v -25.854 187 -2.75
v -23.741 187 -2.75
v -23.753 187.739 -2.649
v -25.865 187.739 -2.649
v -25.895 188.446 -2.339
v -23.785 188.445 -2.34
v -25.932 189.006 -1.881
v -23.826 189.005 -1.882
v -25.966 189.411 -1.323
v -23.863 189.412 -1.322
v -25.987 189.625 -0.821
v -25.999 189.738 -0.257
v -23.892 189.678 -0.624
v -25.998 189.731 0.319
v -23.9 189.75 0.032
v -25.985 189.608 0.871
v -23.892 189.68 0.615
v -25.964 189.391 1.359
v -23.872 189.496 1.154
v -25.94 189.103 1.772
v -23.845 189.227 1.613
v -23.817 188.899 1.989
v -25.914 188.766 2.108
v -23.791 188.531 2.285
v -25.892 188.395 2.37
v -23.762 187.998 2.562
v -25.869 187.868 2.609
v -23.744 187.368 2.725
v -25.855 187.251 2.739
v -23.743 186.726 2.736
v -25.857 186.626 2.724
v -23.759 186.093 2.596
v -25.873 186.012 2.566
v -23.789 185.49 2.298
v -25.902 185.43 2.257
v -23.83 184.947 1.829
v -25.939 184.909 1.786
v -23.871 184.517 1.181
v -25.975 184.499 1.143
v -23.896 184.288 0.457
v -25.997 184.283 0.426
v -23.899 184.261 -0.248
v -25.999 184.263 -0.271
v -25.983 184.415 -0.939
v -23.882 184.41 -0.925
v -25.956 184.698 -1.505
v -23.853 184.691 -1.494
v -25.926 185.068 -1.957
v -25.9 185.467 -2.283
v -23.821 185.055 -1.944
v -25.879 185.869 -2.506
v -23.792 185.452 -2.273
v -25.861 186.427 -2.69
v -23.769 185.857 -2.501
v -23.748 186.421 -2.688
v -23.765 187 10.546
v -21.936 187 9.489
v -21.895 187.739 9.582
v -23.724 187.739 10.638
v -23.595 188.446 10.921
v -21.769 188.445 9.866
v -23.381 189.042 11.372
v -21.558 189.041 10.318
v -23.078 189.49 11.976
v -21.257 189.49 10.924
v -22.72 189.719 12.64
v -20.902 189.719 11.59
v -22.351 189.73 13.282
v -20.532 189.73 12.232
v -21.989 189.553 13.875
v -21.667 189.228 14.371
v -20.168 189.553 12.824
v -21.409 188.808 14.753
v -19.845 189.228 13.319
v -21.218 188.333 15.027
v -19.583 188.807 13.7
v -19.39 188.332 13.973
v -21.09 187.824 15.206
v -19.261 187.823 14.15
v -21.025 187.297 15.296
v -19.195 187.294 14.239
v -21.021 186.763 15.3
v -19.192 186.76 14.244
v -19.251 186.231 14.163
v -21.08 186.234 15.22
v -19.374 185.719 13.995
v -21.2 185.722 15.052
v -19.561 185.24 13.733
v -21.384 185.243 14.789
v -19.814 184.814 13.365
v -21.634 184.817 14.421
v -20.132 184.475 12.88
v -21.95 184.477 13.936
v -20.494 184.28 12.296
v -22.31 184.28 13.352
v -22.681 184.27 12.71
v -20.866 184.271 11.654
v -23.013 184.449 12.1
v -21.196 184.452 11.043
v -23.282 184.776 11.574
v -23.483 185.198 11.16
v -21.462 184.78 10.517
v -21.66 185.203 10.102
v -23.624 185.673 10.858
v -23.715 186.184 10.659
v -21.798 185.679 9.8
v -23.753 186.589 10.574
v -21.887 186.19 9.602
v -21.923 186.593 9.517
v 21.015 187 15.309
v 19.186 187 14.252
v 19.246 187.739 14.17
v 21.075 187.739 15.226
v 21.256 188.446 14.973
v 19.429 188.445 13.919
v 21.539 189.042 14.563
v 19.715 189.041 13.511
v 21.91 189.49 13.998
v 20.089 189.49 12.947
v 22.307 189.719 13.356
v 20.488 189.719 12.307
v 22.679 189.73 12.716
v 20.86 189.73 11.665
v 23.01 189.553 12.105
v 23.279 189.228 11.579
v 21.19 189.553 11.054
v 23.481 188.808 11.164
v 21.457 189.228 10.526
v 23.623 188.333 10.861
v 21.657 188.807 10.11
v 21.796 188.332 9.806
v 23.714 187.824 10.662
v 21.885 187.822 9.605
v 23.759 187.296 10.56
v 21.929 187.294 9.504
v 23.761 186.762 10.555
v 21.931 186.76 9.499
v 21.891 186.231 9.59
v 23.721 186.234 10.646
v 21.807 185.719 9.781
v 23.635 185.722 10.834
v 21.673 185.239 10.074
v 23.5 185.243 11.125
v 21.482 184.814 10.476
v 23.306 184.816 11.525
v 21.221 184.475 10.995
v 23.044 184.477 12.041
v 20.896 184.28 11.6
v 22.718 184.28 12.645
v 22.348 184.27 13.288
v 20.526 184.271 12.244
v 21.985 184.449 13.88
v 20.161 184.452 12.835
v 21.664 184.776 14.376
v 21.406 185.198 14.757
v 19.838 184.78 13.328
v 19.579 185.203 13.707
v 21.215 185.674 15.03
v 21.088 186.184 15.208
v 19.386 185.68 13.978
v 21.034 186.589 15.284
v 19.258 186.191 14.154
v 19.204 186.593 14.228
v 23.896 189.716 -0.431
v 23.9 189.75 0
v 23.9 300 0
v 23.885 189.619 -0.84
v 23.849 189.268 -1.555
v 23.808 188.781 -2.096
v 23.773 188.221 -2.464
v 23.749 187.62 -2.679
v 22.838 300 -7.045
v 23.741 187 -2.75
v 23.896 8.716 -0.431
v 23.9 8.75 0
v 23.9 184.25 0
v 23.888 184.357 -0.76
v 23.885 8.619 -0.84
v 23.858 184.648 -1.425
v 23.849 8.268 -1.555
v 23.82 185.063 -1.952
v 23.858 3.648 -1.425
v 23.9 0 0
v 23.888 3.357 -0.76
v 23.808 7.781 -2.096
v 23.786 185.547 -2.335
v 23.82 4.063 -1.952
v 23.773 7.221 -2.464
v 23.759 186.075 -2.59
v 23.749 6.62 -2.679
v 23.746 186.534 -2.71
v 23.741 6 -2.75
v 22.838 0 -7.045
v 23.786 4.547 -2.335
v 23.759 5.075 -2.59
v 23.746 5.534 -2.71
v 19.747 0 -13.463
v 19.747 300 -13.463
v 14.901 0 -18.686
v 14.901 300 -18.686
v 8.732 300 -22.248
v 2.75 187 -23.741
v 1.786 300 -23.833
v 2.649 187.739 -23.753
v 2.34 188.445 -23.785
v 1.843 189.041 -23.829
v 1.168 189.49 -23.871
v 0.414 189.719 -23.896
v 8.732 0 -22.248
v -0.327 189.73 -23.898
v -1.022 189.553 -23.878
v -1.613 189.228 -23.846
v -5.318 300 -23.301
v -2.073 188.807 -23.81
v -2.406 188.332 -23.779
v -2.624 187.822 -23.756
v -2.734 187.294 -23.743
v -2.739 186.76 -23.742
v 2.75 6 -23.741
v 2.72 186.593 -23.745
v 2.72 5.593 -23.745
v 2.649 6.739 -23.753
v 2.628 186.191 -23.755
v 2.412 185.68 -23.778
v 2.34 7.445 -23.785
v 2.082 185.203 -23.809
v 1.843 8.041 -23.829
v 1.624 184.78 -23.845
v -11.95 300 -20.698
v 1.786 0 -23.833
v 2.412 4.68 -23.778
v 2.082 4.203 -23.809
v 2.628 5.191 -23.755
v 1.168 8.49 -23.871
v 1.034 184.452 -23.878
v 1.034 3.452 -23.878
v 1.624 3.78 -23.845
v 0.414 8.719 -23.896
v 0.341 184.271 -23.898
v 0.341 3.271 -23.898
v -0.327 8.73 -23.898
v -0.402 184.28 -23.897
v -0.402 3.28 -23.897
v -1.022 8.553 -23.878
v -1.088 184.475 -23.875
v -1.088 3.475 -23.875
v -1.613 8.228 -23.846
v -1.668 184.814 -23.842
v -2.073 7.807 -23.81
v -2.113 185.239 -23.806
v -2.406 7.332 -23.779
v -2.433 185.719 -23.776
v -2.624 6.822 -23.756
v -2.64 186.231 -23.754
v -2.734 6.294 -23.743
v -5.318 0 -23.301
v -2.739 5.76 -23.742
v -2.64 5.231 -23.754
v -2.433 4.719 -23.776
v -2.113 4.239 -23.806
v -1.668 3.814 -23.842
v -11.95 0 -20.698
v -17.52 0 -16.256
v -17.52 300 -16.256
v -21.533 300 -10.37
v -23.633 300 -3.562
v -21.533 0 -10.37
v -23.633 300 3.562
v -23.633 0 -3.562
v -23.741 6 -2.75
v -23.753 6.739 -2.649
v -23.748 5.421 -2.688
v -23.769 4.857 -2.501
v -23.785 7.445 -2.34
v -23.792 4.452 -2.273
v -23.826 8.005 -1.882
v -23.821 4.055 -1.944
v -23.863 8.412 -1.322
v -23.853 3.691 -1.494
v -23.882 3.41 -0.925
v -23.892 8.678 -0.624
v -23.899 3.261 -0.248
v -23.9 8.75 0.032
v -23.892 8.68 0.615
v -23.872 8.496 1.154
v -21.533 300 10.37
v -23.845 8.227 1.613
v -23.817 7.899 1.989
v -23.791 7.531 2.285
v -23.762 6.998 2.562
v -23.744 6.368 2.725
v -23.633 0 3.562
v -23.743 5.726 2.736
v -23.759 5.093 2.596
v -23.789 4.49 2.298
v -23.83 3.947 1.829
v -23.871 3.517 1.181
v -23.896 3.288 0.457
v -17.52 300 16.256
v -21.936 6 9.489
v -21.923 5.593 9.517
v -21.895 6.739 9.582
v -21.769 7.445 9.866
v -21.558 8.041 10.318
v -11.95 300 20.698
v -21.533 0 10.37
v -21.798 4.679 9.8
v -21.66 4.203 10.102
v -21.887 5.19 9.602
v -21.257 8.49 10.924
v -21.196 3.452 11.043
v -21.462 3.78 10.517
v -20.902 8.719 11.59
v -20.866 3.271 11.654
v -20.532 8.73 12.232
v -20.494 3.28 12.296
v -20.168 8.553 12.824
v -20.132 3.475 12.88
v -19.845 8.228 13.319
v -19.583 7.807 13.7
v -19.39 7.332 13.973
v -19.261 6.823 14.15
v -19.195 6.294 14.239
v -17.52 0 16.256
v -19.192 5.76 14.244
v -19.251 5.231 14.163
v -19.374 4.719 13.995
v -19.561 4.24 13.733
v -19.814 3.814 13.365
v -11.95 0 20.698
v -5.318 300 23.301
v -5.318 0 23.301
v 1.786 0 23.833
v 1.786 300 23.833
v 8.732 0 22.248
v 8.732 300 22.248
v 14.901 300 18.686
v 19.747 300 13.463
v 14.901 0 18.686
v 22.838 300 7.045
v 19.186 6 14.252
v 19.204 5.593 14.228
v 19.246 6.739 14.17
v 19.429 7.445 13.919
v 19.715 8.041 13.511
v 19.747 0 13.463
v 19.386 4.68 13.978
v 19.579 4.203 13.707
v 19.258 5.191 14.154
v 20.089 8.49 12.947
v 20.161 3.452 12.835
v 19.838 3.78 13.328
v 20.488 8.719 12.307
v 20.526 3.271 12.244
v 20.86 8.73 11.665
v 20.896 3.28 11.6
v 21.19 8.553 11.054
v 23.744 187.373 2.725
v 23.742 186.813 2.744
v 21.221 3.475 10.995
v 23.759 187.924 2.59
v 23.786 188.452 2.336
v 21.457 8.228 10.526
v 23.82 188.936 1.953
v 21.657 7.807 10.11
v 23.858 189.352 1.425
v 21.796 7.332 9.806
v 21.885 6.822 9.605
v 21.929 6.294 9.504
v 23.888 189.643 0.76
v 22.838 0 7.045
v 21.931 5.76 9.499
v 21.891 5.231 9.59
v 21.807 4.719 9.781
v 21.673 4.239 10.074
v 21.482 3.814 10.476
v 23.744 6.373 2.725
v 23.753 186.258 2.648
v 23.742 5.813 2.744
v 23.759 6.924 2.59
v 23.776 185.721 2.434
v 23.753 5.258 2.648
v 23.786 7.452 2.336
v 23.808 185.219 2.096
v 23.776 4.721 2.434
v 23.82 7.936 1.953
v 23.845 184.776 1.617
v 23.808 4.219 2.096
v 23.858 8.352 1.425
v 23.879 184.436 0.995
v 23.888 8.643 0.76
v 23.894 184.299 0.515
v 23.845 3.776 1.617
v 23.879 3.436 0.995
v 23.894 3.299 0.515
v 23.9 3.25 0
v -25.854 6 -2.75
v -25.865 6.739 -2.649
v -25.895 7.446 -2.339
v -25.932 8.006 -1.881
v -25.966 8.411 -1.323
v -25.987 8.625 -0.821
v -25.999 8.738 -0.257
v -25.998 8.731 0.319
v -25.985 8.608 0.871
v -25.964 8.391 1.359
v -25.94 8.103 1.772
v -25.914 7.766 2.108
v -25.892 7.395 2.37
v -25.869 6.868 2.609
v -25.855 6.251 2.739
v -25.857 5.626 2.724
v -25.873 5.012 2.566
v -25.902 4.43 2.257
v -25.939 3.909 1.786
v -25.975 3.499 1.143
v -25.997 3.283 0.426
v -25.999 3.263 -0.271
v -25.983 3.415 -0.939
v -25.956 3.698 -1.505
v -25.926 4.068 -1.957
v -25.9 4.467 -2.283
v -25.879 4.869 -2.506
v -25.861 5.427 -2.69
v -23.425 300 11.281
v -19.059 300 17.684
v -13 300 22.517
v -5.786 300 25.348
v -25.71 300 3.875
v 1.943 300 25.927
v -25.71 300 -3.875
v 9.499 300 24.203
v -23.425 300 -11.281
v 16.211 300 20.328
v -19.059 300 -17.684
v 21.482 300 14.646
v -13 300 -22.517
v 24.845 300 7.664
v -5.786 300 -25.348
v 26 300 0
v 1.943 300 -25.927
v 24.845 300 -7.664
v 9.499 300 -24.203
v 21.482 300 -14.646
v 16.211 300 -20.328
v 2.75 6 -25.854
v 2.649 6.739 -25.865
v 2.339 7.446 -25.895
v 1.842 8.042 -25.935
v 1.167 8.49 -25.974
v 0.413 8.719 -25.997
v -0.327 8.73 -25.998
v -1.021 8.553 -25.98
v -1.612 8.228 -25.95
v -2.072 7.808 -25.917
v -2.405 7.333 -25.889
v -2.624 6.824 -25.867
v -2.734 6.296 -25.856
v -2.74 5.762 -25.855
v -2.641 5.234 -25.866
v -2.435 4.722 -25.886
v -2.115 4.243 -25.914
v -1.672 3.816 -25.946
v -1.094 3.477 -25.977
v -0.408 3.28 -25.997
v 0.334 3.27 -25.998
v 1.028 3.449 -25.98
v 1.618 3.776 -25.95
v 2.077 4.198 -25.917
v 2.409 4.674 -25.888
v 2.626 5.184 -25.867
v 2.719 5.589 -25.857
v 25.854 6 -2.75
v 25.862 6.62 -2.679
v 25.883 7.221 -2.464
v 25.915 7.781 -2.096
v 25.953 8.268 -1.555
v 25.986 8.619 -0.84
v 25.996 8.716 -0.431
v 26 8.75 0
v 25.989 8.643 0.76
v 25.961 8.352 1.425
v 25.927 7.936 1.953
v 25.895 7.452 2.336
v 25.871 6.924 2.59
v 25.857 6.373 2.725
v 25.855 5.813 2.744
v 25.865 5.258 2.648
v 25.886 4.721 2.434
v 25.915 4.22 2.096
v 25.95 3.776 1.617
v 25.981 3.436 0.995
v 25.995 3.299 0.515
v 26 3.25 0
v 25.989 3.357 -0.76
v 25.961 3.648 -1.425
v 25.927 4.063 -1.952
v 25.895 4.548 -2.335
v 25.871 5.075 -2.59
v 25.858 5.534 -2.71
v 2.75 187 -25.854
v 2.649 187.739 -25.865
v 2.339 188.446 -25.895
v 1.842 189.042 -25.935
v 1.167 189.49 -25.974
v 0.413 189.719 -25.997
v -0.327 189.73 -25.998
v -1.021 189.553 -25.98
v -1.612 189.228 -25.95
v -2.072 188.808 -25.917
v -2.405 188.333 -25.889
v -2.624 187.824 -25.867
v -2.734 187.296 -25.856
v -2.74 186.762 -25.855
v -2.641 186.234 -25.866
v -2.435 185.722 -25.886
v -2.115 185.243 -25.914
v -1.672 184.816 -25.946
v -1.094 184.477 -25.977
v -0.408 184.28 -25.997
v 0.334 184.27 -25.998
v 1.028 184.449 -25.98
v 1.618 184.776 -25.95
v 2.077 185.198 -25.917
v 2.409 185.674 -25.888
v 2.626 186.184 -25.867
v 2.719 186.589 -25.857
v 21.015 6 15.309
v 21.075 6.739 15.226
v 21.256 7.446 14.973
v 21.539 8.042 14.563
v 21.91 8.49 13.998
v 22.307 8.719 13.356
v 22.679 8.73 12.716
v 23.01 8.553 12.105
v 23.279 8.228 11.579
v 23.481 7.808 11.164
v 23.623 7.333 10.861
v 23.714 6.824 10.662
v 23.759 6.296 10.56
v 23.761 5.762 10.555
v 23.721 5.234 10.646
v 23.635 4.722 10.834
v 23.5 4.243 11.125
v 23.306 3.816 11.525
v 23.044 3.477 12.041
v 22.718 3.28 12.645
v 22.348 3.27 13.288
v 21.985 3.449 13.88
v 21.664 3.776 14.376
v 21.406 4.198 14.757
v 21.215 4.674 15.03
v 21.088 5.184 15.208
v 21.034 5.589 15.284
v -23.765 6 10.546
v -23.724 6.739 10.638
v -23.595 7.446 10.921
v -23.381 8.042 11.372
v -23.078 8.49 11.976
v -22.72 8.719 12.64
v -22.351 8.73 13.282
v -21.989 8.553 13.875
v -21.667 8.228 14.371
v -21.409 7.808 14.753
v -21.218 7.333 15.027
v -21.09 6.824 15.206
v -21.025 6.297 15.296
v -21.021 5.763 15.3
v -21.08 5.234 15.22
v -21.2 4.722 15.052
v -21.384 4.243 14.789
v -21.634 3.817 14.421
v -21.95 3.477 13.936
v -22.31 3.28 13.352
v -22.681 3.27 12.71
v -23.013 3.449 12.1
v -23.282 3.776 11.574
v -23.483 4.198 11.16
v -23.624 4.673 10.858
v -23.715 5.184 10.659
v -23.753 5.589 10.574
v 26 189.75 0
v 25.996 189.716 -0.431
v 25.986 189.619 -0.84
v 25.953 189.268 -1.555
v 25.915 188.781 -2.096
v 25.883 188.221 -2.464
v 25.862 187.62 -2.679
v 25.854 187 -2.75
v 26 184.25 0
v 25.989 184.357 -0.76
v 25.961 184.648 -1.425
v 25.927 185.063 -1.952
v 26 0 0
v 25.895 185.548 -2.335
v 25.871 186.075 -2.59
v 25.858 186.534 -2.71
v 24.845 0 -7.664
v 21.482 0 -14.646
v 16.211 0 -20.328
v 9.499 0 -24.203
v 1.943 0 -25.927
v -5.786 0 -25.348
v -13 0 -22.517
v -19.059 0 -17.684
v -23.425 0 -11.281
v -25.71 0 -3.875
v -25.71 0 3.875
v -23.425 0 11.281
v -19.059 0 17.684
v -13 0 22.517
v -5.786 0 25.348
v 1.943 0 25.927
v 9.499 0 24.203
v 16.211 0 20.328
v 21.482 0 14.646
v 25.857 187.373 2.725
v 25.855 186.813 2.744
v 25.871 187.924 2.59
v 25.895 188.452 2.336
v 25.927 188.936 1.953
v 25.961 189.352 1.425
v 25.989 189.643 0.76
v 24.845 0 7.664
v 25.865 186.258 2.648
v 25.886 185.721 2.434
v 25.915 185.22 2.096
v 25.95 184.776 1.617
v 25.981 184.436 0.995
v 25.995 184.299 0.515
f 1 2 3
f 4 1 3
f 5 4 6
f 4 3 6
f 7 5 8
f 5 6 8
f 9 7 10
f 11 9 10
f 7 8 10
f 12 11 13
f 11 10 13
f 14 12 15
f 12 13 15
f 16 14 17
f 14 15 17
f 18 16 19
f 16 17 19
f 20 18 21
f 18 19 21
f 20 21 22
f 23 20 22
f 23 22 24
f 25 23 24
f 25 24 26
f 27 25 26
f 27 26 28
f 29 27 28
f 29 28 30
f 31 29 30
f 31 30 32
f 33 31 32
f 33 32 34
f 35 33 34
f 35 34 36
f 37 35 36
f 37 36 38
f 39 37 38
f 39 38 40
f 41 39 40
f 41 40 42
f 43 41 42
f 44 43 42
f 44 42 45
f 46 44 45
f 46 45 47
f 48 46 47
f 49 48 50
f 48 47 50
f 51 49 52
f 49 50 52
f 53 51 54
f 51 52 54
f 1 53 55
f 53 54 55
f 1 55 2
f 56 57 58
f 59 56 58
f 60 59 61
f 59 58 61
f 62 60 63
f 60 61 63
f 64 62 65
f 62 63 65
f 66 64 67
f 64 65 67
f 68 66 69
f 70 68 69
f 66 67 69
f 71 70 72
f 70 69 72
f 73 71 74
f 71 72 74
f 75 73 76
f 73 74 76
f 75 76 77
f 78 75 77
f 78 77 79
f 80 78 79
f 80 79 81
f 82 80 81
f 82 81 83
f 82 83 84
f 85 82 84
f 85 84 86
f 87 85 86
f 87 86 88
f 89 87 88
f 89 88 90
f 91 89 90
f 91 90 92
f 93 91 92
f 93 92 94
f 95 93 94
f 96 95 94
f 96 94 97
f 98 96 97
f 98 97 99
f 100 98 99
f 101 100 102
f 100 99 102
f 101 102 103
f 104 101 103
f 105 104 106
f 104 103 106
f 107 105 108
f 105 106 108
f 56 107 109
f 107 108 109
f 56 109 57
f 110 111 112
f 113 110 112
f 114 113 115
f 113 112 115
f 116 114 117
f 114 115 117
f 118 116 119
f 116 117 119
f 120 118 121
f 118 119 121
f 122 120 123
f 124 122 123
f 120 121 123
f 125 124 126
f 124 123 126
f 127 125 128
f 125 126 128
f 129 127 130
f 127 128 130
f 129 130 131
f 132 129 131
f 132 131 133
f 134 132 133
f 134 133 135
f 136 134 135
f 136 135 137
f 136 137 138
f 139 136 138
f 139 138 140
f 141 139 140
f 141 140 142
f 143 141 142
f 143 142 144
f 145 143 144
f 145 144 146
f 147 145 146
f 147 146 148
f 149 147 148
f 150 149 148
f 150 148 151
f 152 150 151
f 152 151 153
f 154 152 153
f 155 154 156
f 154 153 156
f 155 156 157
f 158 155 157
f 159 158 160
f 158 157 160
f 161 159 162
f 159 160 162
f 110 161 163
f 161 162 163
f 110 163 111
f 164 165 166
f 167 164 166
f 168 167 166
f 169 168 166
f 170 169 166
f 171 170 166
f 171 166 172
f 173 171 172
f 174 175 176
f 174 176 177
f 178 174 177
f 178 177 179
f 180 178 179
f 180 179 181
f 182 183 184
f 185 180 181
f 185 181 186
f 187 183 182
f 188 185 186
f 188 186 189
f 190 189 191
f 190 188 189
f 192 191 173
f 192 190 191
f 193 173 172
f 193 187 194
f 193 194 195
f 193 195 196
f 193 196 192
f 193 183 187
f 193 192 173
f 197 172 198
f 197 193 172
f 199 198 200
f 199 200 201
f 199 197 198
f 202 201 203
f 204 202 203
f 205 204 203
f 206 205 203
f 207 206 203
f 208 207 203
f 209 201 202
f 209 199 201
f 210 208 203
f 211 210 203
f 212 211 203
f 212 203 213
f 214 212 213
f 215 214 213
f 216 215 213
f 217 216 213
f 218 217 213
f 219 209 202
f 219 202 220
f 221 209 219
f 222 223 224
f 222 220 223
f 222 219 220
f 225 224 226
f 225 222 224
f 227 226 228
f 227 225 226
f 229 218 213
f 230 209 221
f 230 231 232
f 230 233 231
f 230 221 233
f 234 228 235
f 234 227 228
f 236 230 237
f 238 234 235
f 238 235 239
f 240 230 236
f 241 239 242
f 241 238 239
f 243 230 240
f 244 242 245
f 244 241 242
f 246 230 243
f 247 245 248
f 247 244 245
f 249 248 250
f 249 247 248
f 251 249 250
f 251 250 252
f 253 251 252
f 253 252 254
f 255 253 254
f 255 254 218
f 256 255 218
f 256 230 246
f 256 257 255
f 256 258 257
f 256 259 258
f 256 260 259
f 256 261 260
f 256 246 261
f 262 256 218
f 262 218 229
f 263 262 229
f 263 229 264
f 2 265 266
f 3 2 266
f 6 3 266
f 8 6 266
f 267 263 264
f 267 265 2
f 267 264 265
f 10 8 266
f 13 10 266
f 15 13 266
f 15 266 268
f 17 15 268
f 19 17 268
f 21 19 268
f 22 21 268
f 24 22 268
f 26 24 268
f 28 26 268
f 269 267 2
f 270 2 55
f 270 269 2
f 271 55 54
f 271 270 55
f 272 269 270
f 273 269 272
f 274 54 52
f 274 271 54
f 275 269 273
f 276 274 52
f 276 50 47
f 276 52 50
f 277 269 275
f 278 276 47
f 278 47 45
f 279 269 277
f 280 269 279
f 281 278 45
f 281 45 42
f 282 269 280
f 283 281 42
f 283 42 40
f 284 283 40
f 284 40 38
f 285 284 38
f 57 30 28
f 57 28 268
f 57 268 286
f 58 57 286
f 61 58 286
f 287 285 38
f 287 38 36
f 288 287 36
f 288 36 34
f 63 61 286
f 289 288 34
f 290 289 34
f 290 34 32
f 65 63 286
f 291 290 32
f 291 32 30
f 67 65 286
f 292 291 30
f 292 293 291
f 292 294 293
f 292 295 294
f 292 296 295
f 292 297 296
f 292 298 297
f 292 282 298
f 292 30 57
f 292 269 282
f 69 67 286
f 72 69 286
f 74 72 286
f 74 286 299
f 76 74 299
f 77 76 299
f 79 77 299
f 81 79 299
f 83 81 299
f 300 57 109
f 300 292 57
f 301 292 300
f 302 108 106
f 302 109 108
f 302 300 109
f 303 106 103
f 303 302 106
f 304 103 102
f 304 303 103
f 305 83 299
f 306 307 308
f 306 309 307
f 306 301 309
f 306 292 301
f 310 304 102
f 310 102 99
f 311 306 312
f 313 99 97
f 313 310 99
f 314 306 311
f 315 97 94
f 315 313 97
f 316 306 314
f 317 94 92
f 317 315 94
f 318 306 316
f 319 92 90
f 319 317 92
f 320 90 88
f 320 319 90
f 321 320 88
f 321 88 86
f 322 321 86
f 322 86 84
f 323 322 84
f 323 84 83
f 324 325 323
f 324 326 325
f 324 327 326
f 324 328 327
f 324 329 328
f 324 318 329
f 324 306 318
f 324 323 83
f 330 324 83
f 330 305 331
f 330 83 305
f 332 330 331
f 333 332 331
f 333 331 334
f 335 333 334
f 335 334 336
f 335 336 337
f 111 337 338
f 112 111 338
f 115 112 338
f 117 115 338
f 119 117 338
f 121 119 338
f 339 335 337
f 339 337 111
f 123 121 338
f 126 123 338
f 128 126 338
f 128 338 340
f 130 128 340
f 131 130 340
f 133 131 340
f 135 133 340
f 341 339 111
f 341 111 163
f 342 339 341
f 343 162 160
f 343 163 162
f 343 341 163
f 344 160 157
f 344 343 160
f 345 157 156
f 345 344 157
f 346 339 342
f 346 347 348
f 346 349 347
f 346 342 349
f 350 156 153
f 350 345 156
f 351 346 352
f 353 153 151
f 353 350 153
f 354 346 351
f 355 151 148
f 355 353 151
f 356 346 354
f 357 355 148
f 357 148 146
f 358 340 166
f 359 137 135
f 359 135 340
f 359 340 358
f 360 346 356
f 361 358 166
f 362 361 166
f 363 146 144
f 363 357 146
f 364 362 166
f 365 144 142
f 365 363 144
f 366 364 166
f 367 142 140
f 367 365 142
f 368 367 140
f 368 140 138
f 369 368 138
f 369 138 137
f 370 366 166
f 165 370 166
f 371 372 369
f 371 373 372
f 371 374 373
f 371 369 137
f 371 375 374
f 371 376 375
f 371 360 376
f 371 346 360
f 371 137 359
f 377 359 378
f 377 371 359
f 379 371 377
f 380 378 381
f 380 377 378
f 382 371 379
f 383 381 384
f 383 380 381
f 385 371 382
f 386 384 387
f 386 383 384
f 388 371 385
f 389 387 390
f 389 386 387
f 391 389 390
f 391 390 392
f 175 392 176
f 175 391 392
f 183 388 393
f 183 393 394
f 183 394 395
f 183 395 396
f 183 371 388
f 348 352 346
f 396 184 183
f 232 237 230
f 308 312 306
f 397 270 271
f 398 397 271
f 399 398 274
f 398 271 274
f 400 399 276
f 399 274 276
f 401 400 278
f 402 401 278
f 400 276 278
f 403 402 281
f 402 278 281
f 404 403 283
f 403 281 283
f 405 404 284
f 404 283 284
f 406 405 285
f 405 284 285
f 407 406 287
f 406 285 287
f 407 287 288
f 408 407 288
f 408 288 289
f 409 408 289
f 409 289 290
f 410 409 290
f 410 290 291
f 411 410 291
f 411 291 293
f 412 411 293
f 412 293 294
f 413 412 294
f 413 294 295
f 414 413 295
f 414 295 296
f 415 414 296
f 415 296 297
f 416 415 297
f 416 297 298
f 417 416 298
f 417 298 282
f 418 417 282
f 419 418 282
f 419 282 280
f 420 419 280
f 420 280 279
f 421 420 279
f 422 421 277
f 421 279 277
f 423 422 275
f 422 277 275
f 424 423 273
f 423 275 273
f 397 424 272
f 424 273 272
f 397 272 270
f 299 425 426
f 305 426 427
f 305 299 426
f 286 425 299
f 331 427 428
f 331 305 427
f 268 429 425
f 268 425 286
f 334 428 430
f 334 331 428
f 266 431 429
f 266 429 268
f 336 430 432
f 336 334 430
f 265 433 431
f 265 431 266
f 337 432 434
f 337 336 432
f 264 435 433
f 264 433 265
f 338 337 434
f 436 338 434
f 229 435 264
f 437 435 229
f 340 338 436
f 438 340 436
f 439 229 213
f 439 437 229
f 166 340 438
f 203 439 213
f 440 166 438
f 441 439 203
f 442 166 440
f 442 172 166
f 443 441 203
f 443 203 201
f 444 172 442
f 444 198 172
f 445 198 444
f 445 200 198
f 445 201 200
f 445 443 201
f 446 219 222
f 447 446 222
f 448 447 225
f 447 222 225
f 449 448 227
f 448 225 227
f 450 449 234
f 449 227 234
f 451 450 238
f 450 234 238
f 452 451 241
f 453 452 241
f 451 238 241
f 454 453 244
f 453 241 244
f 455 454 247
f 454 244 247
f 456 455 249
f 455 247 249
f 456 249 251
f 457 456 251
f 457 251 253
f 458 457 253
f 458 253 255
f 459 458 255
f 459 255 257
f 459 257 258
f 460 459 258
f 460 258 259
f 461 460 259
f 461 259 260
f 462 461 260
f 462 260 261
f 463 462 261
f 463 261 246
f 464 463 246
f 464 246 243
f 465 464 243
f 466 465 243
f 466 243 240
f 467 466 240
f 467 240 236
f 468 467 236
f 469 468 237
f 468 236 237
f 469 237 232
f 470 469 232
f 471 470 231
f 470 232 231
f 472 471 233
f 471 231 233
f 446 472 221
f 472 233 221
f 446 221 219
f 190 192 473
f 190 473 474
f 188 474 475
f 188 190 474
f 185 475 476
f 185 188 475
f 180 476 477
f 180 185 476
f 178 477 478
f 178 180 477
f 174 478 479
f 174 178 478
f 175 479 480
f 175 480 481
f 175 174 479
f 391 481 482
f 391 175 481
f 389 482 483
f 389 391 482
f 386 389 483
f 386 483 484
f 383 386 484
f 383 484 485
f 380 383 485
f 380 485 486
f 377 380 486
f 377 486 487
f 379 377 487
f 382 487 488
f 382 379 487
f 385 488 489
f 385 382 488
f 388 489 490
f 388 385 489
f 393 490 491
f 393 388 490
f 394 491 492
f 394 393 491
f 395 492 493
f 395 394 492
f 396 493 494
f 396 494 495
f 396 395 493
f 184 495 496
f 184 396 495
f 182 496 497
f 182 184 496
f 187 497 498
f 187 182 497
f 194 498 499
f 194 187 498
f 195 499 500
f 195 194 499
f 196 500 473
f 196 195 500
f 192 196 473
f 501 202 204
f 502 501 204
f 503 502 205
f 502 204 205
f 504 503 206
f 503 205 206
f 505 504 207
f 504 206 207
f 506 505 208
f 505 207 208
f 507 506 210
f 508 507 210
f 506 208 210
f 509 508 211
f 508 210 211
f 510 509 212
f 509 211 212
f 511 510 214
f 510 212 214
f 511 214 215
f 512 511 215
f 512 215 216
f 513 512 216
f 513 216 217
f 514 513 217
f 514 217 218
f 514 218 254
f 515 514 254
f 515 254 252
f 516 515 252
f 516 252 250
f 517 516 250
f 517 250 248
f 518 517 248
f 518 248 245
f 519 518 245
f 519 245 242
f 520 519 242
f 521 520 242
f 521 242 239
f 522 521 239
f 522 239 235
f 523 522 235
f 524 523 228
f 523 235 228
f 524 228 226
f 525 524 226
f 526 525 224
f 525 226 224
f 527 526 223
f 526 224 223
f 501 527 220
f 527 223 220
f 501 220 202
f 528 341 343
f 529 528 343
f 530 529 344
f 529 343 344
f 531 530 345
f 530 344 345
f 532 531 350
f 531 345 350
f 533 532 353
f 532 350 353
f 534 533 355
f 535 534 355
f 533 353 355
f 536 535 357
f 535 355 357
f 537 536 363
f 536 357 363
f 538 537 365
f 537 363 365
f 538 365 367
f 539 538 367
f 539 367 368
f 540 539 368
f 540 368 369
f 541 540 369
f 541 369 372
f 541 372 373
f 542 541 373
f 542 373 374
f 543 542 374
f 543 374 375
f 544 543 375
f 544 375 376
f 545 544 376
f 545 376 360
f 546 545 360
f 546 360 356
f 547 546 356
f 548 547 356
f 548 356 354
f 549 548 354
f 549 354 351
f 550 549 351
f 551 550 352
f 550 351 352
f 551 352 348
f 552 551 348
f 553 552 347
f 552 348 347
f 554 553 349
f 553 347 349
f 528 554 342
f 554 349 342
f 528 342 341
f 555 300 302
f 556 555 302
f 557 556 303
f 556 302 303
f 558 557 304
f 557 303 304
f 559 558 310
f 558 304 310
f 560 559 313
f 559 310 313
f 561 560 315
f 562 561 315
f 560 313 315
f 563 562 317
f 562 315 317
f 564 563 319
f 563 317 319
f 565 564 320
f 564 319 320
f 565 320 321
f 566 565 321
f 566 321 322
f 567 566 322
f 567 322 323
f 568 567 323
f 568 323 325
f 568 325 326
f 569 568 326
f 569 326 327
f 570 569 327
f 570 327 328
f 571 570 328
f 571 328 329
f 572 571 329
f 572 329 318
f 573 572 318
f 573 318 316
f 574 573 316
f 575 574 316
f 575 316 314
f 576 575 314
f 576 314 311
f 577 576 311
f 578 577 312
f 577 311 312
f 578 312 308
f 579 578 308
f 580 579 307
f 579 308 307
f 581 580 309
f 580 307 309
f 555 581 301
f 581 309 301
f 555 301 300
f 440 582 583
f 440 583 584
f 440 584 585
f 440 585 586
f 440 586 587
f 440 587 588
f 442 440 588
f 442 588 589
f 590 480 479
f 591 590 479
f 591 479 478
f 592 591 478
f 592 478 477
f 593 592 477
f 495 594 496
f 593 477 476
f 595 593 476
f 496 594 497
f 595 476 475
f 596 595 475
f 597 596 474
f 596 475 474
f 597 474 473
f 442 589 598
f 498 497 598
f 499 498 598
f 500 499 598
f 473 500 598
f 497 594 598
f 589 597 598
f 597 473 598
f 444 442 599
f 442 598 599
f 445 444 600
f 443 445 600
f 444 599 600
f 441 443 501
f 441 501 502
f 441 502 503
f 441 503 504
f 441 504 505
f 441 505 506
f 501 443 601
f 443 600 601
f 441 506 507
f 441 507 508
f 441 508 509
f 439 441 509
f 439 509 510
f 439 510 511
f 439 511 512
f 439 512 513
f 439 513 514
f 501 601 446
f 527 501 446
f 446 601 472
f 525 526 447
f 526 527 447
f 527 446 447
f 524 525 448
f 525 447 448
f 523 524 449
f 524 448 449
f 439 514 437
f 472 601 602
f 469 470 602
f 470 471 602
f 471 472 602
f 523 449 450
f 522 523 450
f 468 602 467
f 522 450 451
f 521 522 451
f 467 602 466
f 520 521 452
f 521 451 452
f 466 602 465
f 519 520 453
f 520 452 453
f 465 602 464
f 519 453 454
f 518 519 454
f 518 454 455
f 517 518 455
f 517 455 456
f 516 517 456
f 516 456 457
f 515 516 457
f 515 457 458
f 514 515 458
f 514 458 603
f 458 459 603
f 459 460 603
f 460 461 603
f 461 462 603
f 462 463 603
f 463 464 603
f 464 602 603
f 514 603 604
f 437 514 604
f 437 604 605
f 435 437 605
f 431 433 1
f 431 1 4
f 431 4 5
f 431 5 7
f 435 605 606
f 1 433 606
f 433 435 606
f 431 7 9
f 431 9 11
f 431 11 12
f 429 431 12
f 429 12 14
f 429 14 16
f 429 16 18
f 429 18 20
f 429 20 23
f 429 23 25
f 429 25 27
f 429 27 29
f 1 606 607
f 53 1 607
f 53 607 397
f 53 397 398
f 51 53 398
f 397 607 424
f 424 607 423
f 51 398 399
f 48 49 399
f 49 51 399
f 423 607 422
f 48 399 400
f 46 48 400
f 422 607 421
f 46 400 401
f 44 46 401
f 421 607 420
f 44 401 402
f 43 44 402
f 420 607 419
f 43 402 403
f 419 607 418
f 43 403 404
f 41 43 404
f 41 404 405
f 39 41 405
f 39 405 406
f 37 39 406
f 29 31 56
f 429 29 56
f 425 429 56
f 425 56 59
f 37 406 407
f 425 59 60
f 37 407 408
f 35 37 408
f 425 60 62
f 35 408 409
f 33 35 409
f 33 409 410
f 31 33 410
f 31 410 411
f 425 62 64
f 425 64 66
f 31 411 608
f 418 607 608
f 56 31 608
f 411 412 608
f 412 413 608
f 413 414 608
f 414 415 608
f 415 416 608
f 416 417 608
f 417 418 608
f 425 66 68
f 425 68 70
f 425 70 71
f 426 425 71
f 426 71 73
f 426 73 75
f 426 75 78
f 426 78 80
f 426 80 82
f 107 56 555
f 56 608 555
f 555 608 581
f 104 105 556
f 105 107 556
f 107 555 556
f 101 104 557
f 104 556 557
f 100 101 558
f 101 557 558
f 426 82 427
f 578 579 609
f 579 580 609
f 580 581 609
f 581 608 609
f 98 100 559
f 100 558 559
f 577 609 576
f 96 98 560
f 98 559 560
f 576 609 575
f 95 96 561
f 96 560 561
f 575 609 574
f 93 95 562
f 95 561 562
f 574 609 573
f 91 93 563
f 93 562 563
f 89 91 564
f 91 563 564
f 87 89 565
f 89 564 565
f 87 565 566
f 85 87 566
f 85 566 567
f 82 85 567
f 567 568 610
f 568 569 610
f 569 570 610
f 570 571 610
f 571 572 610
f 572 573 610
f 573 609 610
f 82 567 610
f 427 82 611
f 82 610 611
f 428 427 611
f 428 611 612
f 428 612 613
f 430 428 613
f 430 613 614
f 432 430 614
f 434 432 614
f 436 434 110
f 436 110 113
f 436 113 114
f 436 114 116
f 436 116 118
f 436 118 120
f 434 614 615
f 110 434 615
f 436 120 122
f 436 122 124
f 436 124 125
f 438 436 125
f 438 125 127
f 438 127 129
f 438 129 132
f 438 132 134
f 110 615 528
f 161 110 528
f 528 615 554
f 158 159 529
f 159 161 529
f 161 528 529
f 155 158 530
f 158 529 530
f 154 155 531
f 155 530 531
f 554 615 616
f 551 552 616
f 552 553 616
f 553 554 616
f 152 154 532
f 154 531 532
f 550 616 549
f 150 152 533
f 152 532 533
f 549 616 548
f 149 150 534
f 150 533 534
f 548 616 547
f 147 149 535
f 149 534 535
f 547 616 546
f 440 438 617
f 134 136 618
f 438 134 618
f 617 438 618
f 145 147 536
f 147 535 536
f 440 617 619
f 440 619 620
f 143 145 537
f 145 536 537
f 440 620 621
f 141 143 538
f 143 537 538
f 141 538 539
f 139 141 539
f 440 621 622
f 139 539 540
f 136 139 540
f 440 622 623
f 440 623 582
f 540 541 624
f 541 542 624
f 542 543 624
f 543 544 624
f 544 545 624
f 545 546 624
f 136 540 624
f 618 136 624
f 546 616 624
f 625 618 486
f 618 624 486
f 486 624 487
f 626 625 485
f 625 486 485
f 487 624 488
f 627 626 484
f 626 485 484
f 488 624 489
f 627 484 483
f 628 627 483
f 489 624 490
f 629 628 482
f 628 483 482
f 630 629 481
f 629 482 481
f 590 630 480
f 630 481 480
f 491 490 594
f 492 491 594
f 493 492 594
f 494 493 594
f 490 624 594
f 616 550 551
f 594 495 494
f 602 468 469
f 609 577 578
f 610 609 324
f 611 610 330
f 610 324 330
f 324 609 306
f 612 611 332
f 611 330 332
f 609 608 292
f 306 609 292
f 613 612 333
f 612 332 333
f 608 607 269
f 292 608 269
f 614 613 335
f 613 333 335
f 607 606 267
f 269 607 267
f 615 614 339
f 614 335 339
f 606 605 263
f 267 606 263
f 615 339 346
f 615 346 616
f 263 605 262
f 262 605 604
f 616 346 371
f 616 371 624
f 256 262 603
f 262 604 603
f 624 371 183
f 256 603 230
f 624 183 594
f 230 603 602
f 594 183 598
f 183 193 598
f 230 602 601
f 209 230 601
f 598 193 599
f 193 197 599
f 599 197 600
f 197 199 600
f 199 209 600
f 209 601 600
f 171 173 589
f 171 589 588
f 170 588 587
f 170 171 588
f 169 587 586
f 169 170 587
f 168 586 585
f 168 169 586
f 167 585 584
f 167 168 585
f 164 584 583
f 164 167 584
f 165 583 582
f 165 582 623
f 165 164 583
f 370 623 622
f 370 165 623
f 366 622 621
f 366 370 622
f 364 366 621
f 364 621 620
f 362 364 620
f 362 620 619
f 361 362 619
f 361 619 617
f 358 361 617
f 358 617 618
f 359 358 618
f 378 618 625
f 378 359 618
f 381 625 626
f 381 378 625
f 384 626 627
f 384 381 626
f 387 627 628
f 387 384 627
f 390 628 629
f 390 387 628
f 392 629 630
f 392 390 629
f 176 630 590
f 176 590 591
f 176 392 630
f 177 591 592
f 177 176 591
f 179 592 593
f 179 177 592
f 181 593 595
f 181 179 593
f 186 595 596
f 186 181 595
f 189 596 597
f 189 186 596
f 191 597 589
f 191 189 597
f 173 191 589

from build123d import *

# Parameters (mm, degrees)
SKETCH1_R               = 26
SKETCH1_R_2             = 23.9
BOSS_EXTRUDE1_DEPTH     = 300
SKETCH3_R               = 2.75
CUT_EXTRUDE2_DEPTH      = 27
CIRPATTERN1_COUNT       = 3
SKETCH5_R               = 2.75
CUT_EXTRUDE3_DEPTH      = 27.0000001
CUT_EXTRUDE3_DEPTH_BACK = 27.0000001


with BuildPart() as part:
    # Sketch1 → Boss-Extrude1 (new body)
    with BuildSketch(Plane(origin=(0, 0, 0), x_dir=(1, 0, 0), z_dir=(0, 1, 0))):
        Circle(SKETCH1_R)
        Circle(SKETCH1_R_2, mode=Mode.SUBTRACT)
    extrude(amount=BOSS_EXTRUDE1_DEPTH)

    # Sketch3 → Cut-Extrude2 (cut, through all)
    with BuildSketch(Plane.XY):
        with Locations((0, 6)):
            Circle(SKETCH3_R)
        with Locations((0, 187)):
            Circle(SKETCH3_R)
    cut_extrude2 = extrude(amount=-CUT_EXTRUDE2_DEPTH, mode=Mode.SUBTRACT)

    # CirPattern1: Cut-Extrude2 ×3 about axis
    cirpattern1_axis = Axis((0, 300, 0), (0, -1, 0))
    for i in range(1, CIRPATTERN1_COUNT):
        add(cut_extrude2.rotate(cirpattern1_axis, i * 360 / CIRPATTERN1_COUNT), mode=Mode.SUBTRACT)

    # Sketch5 → Cut-Extrude3 (cut, two sides)
    with BuildSketch(Plane(origin=(0, 0, 0), x_dir=(0, 0, -1), z_dir=(1, 0, 0))) as cut_extrude3_sk:
        with Locations((0, 187)):
            Circle(SKETCH5_R)
        with Locations((0, 6)):
            Circle(SKETCH5_R)
    extrude(amount=CUT_EXTRUDE3_DEPTH, mode=Mode.SUBTRACT)
    extrude(cut_extrude3_sk.sketch, amount=-CUT_EXTRUDE3_DEPTH_BACK, mode=Mode.SUBTRACT)


solid = part.part
